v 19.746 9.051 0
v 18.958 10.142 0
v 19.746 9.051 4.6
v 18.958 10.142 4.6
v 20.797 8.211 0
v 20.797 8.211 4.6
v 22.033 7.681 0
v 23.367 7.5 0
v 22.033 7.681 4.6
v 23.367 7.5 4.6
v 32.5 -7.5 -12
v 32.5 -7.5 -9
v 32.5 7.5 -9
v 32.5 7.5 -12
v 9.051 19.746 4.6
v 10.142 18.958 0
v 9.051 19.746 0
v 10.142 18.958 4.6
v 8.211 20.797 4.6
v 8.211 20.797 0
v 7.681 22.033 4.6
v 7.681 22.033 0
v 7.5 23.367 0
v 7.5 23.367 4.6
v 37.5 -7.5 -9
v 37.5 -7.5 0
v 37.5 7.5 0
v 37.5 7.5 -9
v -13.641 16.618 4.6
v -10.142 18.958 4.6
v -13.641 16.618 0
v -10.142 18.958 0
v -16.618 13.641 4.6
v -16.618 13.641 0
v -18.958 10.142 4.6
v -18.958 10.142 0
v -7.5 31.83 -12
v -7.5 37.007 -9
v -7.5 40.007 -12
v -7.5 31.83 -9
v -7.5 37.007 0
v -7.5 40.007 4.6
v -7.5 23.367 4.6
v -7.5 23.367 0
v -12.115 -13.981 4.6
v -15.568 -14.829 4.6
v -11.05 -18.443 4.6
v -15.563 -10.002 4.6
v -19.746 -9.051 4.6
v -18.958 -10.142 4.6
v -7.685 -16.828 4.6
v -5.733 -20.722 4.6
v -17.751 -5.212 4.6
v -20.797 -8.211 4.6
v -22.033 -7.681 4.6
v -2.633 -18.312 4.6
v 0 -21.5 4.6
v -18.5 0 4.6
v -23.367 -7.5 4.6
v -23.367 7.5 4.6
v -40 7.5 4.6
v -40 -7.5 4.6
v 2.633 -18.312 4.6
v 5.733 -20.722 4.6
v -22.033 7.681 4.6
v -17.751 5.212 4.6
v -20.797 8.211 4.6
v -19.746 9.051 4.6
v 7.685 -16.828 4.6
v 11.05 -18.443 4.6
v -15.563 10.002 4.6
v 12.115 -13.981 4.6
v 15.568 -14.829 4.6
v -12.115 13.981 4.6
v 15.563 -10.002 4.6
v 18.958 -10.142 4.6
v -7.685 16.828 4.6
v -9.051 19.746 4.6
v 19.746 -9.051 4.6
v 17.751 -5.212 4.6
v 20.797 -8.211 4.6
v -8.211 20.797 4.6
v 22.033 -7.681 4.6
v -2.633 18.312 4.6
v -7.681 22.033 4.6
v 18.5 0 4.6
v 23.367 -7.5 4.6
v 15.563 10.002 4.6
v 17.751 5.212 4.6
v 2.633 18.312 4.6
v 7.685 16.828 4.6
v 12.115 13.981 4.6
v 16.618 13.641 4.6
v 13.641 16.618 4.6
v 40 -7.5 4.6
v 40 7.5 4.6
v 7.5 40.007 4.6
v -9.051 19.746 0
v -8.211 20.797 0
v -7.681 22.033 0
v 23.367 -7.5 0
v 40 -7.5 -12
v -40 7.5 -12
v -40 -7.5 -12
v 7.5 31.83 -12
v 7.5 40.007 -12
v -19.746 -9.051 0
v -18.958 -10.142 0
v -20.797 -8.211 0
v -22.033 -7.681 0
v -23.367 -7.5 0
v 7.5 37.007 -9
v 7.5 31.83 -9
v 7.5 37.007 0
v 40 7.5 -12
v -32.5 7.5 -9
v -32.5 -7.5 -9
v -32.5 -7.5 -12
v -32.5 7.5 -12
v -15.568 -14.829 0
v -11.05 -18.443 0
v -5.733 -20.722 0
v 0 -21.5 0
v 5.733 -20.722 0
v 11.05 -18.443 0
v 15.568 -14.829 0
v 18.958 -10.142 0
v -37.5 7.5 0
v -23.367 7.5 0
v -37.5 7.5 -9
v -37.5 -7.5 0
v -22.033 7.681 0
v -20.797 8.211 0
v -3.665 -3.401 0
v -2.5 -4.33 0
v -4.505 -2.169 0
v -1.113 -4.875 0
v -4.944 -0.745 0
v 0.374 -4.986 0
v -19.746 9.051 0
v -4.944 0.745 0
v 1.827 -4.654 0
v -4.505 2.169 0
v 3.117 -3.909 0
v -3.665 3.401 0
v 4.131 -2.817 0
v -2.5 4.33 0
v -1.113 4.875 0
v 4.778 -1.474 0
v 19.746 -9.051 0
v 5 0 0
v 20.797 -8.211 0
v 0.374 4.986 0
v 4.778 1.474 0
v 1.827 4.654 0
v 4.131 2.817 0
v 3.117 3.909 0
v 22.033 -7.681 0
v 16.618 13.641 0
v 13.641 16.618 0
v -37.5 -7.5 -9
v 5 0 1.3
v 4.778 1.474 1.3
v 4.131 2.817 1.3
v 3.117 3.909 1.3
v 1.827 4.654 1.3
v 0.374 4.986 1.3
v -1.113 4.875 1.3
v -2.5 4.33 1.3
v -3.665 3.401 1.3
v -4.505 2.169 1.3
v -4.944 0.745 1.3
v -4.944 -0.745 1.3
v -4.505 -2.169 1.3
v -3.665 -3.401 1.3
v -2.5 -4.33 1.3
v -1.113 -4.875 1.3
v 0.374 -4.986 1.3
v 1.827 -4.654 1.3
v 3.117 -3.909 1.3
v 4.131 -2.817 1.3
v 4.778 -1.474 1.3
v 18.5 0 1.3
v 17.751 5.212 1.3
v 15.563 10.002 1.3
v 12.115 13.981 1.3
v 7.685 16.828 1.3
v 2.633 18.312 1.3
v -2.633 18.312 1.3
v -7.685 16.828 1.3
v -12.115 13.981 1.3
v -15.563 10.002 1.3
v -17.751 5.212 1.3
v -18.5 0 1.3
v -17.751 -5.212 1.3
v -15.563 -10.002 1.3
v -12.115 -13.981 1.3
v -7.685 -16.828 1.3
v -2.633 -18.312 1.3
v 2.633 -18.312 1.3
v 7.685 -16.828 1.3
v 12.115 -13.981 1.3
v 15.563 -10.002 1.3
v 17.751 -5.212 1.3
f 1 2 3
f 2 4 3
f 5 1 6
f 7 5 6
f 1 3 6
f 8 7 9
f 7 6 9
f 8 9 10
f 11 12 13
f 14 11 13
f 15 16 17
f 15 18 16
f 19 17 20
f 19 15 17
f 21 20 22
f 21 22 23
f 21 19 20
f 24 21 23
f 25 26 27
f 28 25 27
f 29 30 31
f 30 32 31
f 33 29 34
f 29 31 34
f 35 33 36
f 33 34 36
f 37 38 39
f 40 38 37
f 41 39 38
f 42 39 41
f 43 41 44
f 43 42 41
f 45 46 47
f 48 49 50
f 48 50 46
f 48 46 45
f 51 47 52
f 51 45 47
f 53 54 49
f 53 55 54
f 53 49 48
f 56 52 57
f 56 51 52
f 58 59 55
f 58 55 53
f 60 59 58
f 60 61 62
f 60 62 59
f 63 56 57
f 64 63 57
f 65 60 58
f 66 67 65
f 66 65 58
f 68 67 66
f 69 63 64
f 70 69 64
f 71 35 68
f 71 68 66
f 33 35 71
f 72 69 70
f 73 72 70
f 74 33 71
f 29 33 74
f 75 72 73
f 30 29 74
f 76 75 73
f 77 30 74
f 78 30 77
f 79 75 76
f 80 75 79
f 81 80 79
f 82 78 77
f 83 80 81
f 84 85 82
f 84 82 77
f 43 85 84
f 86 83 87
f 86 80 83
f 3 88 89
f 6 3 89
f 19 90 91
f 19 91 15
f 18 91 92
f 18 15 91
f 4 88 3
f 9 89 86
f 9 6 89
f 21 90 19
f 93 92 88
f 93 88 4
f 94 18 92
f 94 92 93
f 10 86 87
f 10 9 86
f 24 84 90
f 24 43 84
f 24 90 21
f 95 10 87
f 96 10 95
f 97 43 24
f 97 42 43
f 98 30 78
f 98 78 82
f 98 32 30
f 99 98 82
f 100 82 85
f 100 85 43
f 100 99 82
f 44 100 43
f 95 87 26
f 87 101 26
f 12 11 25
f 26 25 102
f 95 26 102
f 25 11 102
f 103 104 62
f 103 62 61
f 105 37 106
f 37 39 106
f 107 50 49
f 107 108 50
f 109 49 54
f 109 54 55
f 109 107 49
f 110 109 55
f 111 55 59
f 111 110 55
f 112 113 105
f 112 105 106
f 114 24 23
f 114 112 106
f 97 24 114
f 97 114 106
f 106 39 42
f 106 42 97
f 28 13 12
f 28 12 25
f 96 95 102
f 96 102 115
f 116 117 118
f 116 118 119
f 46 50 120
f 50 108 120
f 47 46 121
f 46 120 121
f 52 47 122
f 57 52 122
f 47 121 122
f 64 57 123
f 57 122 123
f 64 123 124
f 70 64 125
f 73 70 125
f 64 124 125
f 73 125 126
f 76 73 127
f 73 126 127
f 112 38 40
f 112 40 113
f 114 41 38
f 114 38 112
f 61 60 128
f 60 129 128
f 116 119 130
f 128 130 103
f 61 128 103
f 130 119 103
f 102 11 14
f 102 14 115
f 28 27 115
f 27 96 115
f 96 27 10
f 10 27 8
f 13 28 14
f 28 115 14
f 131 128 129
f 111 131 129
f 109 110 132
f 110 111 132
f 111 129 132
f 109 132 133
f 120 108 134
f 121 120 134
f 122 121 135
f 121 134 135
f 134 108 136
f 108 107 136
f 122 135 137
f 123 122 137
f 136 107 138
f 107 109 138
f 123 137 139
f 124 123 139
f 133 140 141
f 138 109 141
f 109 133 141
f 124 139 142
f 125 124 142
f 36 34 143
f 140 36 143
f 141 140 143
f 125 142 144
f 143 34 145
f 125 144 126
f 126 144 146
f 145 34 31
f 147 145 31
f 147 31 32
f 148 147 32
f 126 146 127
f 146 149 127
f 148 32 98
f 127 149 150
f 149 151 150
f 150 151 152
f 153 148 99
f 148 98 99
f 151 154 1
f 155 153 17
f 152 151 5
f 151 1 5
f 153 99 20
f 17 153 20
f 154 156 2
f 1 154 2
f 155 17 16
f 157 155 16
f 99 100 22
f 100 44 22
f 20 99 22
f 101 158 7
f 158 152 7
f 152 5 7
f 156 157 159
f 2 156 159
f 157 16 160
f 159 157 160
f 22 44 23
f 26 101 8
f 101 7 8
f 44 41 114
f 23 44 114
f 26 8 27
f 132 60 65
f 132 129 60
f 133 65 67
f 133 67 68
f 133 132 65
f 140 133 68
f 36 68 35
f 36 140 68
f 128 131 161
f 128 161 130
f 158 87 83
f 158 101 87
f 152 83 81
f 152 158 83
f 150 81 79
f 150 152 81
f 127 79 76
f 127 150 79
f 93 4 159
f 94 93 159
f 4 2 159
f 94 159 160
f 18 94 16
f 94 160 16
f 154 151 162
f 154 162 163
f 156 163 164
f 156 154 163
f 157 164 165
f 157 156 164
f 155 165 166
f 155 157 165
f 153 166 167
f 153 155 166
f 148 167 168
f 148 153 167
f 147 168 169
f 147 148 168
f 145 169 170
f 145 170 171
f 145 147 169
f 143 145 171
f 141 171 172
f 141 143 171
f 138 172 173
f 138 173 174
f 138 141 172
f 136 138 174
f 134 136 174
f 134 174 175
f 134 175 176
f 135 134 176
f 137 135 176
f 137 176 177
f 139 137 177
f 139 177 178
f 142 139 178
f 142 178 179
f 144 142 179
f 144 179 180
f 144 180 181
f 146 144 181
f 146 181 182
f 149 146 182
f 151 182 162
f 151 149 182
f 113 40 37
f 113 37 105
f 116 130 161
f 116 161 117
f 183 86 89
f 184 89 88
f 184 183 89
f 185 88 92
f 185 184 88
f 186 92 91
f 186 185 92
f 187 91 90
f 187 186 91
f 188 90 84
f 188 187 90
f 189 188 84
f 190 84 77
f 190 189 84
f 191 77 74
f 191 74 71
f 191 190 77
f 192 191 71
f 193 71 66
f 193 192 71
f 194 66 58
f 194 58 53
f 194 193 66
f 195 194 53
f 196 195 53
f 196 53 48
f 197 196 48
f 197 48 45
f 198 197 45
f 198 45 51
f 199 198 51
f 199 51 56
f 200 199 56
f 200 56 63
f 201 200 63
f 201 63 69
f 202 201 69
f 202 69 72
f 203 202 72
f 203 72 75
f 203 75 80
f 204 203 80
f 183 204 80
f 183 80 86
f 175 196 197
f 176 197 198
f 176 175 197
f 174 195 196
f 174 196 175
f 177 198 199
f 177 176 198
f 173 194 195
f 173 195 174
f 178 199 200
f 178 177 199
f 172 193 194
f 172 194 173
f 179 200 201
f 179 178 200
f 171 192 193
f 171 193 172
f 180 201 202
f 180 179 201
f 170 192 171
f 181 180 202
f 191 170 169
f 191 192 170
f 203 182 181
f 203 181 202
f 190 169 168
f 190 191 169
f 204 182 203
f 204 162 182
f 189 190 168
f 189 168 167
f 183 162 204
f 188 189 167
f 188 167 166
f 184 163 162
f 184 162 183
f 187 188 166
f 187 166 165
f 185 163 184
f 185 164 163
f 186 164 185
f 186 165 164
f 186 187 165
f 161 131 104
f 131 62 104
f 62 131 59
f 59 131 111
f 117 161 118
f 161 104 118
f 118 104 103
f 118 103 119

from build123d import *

# Parameters (mm, degrees)
F0_R     = 18.5
F0_R_2   = 5
F1_DEPTH = 1.3
F2_DEPTH = 4.6
F0_W     = 15
F0_H     = 3
F0_H_2   = 5.176528
F0_W_2   = 2.5
F0_H_3   = 15
F0_W_3   = 5
F3_DEPTH = 4.6
F4_DEPTH = 12
F5_DEPTH = 9
F6_R     = 5


with BuildPart() as f1:
    # F0 (on Top) → F1 (new body)
    with BuildSketch(Plane.XY):
        with BuildLine():
            ThreePointArc((20.149442, -7.5), (21.159667, -3.810315), (21.5, 0))
            ThreePointArc((21.5, 0), (21.159667, 3.810315), (20.149442, 7.5))
            ThreePointArc((20.149442, 7.5), (15.202796, 15.202796), (7.5, 20.149442))
            ThreePointArc((7.5, 20.149442), (0, 21.5), (-7.5, 20.149442))
            ThreePointArc((-7.5, 20.149442), (-15.202796, 15.202796), (-20.149442, 7.5))
            ThreePointArc((-20.149442, 7.5), (-21.5, 0), (-20.149442, -7.5))
            ThreePointArc((-20.149442, -7.5), (0, -21.5), (20.149442, -7.5))
        make_face()
        Circle(F0_R, mode=Mode.SUBTRACT)
        Circle(F0_R)
        Circle(F0_R_2, mode=Mode.SUBTRACT)
    extrude(amount=F1_DEPTH)

    # F0 (on Top) → F2 (join)
    with BuildSketch(Plane.XY):
        with BuildLine():
            ThreePointArc((20.149442, -7.5), (21.159667, -3.810315), (21.5, 0))
            ThreePointArc((21.5, 0), (21.159667, 3.810315), (20.149442, 7.5))
            ThreePointArc((20.149442, 7.5), (15.202796, 15.202796), (7.5, 20.149442))
            ThreePointArc((7.5, 20.149442), (0, 21.5), (-7.5, 20.149442))
            ThreePointArc((-7.5, 20.149442), (-15.202796, 15.202796), (-20.149442, 7.5))
            ThreePointArc((-20.149442, 7.5), (-21.5, 0), (-20.149442, -7.5))
            ThreePointArc((-20.149442, -7.5), (0, -21.5), (20.149442, -7.5))
        make_face()
        Circle(F0_R, mode=Mode.SUBTRACT)
    extrude(amount=F2_DEPTH)

    # F0 (on Top) → F3 (join)
    with BuildSketch(Plane.XY):
        with Locations((0, 38.507013)):
            Rectangle(F0_W, F0_H)
        with Locations((0, 34.418749)):
            Rectangle(F0_W, F0_H_2)
        with BuildLine():
            ThreePointArc((-7.5, 20.149442), (0, 21.5), (7.5, 20.149442))
            Line((7.5, 20.149442), (7.5, 31.830485))
            Line((7.5, 31.830485), (-7.5, 31.830485))
            Line((-7.5, 31.830485), (-7.5, 20.149442))
        make_face()
        with Locations((-38.75, 0)):
            Rectangle(F0_W_2, F0_H_3)
        with Locations((-35, 0)):
            Rectangle(F0_W_3, F0_H_3)
        with BuildLine():
            Line((-32.5, -7.5), (-20.149442, -7.5))
            ThreePointArc((-20.149442, -7.5), (-21.5, 0), (-20.149442, 7.5))
            Line((-20.149442, 7.5), (-32.5, 7.5))
            Line((-32.5, 7.5), (-32.5, -7.5))
        make_face()
        with BuildLine():
            ThreePointArc((20.149442, 7.5), (21.159667, 3.810315), (21.5, 0))
            ThreePointArc((21.5, 0), (21.159667, -3.810315), (20.149442, -7.5))
            Line((20.149442, -7.5), (32.5, -7.5))
            Line((32.5, -7.5), (32.5, 7.5))
            Line((32.5, 7.5), (20.149442, 7.5))
        make_face()
        with Locations((35, 0)):
            Rectangle(F0_W_3, F0_H_3)
        with Locations((38.75, 0)):
            Rectangle(F0_W_2, F0_H_3)
    extrude(amount=F3_DEPTH)

    # F0 (on Top) → F4 (join)
    with BuildSketch(Plane.XY):
        with Locations((0, 34.418749)):
            Rectangle(F0_W, F0_H_2)
        with Locations((0, 38.507013)):
            Rectangle(F0_W, F0_H)
        with Locations((38.75, 0)):
            Rectangle(F0_W_2, F0_H_3)
        with Locations((35, 0)):
            Rectangle(F0_W_3, F0_H_3)
        with Locations((-35, 0)):
            Rectangle(F0_W_3, F0_H_3)
        with Locations((-38.75, 0)):
            Rectangle(F0_W_2, F0_H_3)
    extrude(amount=-F4_DEPTH)

    # F0 (on Top) → F5 (cut)
    with BuildSketch(Plane.XY):
        with Locations((35, 0)):
            Rectangle(F0_W_3, F0_H_3)
        with Locations((-35, 0)):
            Rectangle(F0_W_3, F0_H_3)
        with Locations((0, 34.418749)):
            Rectangle(F0_W, F0_H_2)
    extrude(amount=-F5_DEPTH, mode=Mode.SUBTRACT)

    # F6
    f6_edges = [f1.edges().sort_by_distance(p)[0] for p in [
        (7.5, 20.149442, 2.3),
        (20.149442, -7.5, 2.3),
        (20.149442, 7.5, 2.3),
        (-7.5, 20.149442, 2.3),
        (-20.149442, 7.5, 2.3),
        (-20.149442, -7.5, 2.3),
    ]]
    fillet(f6_edges, radius=F6_R)


solid = f1.part
